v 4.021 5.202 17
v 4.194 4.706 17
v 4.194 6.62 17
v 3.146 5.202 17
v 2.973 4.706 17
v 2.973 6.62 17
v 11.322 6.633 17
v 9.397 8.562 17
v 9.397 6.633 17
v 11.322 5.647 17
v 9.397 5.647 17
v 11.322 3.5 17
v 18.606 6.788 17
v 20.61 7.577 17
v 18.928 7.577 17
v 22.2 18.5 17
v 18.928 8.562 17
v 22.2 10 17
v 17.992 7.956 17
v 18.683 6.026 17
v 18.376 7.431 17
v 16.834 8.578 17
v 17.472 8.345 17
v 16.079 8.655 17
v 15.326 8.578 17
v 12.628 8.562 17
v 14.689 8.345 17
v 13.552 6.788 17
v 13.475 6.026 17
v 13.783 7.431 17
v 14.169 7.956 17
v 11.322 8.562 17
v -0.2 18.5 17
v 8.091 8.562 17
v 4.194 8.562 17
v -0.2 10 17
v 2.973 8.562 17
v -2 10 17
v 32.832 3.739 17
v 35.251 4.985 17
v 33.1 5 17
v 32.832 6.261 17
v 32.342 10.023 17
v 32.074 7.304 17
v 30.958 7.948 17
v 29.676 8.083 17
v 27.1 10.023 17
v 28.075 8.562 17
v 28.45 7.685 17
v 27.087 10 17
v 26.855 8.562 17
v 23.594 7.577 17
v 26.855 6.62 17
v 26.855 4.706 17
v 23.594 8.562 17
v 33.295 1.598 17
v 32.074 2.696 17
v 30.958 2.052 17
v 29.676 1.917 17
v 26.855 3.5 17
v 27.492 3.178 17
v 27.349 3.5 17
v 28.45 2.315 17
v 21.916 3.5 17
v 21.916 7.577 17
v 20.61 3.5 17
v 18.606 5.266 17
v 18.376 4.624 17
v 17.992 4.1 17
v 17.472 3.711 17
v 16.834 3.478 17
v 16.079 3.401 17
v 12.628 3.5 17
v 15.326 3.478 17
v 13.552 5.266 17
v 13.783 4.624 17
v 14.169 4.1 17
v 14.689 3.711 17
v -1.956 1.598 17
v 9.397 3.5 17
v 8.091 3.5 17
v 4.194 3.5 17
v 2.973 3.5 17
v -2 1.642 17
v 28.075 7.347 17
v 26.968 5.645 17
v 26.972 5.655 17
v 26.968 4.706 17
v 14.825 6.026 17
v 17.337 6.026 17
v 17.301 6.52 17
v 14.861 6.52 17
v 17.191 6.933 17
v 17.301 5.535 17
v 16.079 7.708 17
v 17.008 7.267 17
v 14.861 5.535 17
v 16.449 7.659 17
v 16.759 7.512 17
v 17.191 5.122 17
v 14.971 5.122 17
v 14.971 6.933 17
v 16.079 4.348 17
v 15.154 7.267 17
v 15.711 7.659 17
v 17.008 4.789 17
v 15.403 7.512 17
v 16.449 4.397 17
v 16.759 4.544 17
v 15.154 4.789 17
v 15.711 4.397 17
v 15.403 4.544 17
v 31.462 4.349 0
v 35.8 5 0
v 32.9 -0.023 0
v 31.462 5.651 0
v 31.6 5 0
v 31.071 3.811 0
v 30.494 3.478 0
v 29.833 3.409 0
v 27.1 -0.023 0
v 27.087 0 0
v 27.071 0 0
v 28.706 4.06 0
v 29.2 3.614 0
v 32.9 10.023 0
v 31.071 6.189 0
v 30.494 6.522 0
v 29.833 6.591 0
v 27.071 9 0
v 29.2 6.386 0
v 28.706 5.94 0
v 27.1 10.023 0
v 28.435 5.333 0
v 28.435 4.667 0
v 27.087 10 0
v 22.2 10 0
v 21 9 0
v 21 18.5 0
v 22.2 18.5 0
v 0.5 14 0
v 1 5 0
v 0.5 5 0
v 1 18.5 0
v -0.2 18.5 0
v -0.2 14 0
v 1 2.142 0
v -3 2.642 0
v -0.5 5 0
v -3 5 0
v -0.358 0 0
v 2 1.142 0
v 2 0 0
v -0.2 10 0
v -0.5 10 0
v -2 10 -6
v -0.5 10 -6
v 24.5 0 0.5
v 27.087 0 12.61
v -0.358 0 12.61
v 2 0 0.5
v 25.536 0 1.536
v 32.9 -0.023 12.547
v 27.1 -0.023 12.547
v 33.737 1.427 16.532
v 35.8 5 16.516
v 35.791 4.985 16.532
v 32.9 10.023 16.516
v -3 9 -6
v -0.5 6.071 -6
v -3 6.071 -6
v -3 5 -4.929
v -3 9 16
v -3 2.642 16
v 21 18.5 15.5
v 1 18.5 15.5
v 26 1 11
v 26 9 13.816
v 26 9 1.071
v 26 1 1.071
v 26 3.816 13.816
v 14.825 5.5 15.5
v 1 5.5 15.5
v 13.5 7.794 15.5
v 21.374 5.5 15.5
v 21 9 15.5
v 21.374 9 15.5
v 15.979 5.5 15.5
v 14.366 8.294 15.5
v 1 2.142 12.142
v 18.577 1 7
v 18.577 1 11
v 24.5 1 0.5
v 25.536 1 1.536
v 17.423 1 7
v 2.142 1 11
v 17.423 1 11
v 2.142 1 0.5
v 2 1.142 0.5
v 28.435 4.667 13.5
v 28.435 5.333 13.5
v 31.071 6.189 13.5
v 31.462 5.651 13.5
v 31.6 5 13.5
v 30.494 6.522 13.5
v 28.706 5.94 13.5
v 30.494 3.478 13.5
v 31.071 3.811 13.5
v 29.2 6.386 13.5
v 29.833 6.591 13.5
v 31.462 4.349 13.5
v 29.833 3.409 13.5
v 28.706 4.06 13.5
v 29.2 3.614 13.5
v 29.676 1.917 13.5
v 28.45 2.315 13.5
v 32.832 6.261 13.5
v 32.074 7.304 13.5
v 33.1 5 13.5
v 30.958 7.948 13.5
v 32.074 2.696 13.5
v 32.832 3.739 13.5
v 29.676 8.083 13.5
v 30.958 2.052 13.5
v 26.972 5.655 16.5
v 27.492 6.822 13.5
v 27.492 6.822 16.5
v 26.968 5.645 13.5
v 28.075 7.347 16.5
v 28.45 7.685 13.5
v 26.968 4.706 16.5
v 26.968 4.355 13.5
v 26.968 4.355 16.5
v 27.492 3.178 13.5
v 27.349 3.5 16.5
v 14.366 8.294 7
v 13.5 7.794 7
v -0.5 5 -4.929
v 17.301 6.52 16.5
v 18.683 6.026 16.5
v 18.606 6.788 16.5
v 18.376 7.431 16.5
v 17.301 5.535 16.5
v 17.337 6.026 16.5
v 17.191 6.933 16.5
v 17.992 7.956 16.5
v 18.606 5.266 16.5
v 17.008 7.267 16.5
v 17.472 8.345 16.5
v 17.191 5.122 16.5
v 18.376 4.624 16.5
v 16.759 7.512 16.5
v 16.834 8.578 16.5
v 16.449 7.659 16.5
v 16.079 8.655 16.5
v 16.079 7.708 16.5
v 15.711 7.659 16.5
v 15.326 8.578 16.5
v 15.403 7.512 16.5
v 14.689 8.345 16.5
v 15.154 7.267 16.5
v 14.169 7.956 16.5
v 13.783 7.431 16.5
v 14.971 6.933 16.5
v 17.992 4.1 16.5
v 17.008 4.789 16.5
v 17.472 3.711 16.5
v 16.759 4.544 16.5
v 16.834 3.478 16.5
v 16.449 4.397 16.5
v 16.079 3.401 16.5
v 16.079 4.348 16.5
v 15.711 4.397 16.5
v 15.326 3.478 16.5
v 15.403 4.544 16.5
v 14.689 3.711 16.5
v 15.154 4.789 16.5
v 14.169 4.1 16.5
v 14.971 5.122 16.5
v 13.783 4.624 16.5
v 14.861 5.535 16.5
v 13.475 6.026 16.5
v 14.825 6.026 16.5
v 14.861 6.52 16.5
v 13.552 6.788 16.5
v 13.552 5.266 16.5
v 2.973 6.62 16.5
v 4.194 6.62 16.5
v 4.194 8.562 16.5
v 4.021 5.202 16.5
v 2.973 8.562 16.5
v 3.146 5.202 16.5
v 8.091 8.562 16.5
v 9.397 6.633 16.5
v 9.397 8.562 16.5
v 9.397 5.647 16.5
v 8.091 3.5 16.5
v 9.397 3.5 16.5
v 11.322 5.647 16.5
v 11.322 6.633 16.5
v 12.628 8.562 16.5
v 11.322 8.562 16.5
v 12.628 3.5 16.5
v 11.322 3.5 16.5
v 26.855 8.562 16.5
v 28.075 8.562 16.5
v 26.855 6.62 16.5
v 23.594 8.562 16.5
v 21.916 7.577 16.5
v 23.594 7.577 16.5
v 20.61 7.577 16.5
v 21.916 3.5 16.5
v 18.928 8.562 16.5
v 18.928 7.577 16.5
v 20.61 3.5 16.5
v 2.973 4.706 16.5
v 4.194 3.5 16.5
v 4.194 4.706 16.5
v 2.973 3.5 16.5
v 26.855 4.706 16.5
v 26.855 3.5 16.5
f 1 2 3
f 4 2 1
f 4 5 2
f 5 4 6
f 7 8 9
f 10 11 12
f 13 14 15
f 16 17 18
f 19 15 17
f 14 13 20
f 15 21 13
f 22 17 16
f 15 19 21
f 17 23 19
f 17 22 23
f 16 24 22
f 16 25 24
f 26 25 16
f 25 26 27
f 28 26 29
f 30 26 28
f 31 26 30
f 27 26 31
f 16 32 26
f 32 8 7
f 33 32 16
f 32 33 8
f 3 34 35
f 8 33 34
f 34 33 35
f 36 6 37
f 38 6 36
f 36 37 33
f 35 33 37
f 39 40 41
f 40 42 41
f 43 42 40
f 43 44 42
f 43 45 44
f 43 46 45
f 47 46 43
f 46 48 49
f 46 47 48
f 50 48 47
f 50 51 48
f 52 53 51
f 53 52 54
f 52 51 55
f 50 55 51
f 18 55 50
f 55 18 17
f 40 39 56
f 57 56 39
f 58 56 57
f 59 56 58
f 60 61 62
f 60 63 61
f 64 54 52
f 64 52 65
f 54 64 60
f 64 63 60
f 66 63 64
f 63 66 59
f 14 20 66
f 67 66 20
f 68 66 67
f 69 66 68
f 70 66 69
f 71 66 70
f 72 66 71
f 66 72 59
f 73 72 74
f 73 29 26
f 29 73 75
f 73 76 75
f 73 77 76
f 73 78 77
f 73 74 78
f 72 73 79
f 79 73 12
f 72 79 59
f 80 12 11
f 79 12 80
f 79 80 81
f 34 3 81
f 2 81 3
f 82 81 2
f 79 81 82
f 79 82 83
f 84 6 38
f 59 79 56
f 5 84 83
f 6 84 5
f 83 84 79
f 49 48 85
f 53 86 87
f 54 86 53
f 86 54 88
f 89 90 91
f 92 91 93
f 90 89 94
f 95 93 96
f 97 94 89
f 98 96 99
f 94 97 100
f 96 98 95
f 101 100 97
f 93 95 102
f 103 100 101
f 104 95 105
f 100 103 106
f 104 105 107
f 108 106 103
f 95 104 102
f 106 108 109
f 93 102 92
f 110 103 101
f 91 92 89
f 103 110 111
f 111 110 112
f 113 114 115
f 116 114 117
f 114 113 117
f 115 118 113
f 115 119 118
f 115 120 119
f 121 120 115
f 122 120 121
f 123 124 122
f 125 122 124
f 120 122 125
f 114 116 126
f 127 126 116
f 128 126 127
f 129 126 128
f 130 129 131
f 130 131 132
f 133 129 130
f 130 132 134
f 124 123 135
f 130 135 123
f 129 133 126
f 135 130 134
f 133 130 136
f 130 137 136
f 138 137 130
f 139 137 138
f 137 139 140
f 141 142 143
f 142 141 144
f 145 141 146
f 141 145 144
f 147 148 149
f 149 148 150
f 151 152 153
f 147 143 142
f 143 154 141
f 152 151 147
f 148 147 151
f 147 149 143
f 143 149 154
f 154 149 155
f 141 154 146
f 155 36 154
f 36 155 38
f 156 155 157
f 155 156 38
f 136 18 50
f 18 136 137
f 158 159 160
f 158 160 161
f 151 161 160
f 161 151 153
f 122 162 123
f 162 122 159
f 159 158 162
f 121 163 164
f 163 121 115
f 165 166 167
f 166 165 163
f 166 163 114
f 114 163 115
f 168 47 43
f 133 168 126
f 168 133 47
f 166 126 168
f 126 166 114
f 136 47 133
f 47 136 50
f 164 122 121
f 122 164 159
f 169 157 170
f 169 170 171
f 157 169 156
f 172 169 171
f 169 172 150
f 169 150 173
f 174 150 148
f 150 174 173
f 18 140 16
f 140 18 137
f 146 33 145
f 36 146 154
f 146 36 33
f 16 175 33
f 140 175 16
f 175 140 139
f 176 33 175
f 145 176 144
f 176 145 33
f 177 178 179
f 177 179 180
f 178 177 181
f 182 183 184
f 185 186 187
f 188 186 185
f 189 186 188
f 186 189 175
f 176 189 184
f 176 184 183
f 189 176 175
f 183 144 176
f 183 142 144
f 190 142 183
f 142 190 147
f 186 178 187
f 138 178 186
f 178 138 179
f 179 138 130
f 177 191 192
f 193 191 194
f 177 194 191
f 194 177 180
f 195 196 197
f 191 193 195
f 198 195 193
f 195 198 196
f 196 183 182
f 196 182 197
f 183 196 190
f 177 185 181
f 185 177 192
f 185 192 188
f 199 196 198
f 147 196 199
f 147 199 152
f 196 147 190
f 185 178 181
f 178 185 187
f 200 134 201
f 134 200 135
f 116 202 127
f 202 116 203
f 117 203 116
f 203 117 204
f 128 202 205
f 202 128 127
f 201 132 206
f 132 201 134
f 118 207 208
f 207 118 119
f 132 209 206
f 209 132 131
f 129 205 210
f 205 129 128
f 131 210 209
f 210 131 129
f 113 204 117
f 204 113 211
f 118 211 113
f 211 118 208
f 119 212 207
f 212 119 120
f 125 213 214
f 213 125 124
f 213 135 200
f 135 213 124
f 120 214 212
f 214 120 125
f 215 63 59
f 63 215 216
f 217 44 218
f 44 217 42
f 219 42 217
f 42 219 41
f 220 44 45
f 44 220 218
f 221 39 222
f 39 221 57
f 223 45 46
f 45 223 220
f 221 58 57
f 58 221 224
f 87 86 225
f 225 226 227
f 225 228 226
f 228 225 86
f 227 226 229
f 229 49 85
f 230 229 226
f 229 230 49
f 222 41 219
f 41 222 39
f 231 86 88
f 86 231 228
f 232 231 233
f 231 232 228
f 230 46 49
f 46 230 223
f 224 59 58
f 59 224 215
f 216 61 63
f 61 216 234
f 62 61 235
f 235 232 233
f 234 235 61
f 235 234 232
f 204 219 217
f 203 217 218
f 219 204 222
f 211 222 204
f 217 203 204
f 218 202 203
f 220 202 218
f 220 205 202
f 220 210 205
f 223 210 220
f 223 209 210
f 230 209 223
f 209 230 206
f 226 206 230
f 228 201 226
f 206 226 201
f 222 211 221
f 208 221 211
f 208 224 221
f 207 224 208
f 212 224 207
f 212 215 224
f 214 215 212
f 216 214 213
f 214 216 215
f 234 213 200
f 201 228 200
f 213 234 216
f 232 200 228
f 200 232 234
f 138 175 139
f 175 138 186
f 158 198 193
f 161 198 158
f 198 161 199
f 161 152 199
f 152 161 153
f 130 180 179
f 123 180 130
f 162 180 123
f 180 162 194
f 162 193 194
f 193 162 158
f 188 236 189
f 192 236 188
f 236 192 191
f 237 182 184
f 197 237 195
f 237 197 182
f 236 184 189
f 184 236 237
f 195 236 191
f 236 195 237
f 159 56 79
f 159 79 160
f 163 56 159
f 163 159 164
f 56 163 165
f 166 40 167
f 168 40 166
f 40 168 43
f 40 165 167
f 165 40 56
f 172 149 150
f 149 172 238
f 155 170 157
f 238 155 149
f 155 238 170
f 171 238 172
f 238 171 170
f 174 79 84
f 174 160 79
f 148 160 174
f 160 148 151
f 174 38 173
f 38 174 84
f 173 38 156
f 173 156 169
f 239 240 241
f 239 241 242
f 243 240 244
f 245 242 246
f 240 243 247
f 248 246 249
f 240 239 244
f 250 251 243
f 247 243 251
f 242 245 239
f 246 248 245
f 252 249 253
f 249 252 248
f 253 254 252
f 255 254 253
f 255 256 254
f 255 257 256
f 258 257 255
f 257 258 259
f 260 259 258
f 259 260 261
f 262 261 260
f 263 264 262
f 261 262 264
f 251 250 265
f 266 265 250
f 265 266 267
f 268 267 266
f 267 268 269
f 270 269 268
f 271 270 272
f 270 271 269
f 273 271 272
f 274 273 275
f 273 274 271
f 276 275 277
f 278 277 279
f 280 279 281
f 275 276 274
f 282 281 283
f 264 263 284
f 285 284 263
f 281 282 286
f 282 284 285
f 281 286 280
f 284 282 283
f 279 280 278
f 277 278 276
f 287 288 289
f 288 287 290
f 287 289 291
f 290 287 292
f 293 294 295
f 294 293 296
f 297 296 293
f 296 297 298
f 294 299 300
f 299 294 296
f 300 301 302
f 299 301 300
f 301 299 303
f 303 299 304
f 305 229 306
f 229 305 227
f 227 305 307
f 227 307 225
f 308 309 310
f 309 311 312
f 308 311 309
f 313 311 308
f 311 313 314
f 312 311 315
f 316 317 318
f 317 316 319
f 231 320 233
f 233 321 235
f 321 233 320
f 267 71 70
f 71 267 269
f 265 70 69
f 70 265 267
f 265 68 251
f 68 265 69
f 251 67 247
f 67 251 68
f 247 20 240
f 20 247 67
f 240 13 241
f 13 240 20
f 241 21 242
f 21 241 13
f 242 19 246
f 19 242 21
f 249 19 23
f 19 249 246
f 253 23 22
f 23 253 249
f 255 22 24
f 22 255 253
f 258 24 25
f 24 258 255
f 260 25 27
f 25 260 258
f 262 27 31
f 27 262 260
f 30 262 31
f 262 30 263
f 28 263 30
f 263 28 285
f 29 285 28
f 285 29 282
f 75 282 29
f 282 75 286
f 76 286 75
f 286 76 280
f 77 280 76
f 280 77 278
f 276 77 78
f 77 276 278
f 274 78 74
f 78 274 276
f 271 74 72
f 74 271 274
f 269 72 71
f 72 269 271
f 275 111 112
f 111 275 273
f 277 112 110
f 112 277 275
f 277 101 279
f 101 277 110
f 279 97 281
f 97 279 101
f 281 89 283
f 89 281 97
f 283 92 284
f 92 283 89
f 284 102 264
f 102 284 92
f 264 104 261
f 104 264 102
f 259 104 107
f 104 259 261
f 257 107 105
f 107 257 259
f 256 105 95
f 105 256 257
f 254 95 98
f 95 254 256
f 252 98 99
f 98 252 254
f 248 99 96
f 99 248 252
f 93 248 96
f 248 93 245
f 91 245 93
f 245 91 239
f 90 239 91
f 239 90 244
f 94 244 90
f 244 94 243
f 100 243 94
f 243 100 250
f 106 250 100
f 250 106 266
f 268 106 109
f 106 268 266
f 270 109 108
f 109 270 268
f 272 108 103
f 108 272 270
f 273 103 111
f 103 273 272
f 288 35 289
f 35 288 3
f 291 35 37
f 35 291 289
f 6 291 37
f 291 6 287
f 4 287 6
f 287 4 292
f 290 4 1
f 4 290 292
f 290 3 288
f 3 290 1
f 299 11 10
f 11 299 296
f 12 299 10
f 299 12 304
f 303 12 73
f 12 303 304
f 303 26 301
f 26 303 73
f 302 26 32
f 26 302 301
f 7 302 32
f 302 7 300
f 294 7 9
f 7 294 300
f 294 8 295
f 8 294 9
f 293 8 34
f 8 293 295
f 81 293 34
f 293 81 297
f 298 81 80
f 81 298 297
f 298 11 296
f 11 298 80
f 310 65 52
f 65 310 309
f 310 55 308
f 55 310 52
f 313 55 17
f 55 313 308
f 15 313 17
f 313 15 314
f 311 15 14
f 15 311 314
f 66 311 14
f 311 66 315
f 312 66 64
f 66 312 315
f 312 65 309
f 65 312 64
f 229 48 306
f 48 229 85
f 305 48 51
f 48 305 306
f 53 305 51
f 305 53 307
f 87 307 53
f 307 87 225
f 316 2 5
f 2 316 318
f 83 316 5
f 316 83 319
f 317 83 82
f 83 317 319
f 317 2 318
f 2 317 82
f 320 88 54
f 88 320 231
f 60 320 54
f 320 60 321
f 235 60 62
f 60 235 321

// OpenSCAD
extbodyheight_difference = 7;

module fan_nozzle(){
    
difference(){    
union(){
cube([32,10,17]); // Main cube
translate([30,5,0])cylinder(r=5.8,h = 17, $fn=6);    
translate([-3,0,-6]) cube([3,10,23]);
//#translate([-2,5,0])cylinder(r=5.8,h = 17, $fn=6);        
translate([1-1.2,10-1.5,0])cube([22.4,3+extbodyheight_difference,16.5+.5]);


}
// Mounting screw
translate([30,5,-10])cylinder(r=3.2/2,h = 24.5-0.2, $fn=15); // Screw cut
translate([30,5,17-3.5])cylinder(r=3.1,h = 20, $fn=15); // head cut

//#translate([-2,5,-10])cylinder(r=3.2/2,h = 24.5-0.2, $fn=15); // Screw cut
//#translate([-2,5,17-3.5])cylinder(r=3.1,h = 20, $fn=15); // head cut

// Fan entry hole
translate([1,10-1.5,-1])cube([20,5+extbodyheight_difference,16.5]);
translate([1,10-1.5,-1-5])cube([18,3,16.5]);
    
// Airway cutout
difference(){    
translate([1,1,-1])cube([25,8,16.5]);    
translate([0,0,10])rotate([45,0,0])cube([30,8,16.5]);    
translate([-1,-10,-1])rotate([0,0,45])cube([10,8,30]); 
translate([20,0,16])rotate([0,20,0])cube([10,20,10]);    
}
translate([2,-1,-4.5])cube([24,3,5]);
//#translate([-2,-1,-2])rotate([0,45,0])cube([5,10,5]);
translate([22,-1,-2])rotate([0,45,0])cube([5,10,5]);
    
}

// Air director
translate([18,0,7])rotate([0,0,30])cube([1,9,10]);


}

module fancy_corners(){
    
    translate([-10,-10.5,13])rotate([-20,0,0])cube([50,10,15]);
    translate([-16,-10.5,17.5])rotate([0,45,0])cube([10,30,15]);
    
    translate([46.5,-10.5,15])rotate([0,-45,30])cube([10,30,15]);
    translate([28.62,-10.5,15])rotate([0,-45,-30])cube([10,30,15]);

    translate([-5,-1,-7])rotate([0,0,0]) cube([10,6,7]);
    translate([-0.5,-1,-7])rotate([0,0,0]) cube([1,15,7]);
    translate([-5,4,-11])rotate([45,0,0]) cube([10,5,5]);

    //left cut
    translate([-6.5,-8,-5])rotate([0,0,45])cube([10,10,45]);
    translate([-7,-5,12])rotate([0,-45,0])cube([10,30,15]);
    
    translate([-8,4,-10])rotate([0,0,45])cube([10,10,35]);
    
    }

module fan_n(){
difference(){
fan_nozzle();
fancy_corners();    
translate([2,3.5,16.5])linear_extrude(height = 0.6) {text("! HOT !", size = 5, font = "Helvetica Neue:style=Bold");}
}
}
fan_n();
